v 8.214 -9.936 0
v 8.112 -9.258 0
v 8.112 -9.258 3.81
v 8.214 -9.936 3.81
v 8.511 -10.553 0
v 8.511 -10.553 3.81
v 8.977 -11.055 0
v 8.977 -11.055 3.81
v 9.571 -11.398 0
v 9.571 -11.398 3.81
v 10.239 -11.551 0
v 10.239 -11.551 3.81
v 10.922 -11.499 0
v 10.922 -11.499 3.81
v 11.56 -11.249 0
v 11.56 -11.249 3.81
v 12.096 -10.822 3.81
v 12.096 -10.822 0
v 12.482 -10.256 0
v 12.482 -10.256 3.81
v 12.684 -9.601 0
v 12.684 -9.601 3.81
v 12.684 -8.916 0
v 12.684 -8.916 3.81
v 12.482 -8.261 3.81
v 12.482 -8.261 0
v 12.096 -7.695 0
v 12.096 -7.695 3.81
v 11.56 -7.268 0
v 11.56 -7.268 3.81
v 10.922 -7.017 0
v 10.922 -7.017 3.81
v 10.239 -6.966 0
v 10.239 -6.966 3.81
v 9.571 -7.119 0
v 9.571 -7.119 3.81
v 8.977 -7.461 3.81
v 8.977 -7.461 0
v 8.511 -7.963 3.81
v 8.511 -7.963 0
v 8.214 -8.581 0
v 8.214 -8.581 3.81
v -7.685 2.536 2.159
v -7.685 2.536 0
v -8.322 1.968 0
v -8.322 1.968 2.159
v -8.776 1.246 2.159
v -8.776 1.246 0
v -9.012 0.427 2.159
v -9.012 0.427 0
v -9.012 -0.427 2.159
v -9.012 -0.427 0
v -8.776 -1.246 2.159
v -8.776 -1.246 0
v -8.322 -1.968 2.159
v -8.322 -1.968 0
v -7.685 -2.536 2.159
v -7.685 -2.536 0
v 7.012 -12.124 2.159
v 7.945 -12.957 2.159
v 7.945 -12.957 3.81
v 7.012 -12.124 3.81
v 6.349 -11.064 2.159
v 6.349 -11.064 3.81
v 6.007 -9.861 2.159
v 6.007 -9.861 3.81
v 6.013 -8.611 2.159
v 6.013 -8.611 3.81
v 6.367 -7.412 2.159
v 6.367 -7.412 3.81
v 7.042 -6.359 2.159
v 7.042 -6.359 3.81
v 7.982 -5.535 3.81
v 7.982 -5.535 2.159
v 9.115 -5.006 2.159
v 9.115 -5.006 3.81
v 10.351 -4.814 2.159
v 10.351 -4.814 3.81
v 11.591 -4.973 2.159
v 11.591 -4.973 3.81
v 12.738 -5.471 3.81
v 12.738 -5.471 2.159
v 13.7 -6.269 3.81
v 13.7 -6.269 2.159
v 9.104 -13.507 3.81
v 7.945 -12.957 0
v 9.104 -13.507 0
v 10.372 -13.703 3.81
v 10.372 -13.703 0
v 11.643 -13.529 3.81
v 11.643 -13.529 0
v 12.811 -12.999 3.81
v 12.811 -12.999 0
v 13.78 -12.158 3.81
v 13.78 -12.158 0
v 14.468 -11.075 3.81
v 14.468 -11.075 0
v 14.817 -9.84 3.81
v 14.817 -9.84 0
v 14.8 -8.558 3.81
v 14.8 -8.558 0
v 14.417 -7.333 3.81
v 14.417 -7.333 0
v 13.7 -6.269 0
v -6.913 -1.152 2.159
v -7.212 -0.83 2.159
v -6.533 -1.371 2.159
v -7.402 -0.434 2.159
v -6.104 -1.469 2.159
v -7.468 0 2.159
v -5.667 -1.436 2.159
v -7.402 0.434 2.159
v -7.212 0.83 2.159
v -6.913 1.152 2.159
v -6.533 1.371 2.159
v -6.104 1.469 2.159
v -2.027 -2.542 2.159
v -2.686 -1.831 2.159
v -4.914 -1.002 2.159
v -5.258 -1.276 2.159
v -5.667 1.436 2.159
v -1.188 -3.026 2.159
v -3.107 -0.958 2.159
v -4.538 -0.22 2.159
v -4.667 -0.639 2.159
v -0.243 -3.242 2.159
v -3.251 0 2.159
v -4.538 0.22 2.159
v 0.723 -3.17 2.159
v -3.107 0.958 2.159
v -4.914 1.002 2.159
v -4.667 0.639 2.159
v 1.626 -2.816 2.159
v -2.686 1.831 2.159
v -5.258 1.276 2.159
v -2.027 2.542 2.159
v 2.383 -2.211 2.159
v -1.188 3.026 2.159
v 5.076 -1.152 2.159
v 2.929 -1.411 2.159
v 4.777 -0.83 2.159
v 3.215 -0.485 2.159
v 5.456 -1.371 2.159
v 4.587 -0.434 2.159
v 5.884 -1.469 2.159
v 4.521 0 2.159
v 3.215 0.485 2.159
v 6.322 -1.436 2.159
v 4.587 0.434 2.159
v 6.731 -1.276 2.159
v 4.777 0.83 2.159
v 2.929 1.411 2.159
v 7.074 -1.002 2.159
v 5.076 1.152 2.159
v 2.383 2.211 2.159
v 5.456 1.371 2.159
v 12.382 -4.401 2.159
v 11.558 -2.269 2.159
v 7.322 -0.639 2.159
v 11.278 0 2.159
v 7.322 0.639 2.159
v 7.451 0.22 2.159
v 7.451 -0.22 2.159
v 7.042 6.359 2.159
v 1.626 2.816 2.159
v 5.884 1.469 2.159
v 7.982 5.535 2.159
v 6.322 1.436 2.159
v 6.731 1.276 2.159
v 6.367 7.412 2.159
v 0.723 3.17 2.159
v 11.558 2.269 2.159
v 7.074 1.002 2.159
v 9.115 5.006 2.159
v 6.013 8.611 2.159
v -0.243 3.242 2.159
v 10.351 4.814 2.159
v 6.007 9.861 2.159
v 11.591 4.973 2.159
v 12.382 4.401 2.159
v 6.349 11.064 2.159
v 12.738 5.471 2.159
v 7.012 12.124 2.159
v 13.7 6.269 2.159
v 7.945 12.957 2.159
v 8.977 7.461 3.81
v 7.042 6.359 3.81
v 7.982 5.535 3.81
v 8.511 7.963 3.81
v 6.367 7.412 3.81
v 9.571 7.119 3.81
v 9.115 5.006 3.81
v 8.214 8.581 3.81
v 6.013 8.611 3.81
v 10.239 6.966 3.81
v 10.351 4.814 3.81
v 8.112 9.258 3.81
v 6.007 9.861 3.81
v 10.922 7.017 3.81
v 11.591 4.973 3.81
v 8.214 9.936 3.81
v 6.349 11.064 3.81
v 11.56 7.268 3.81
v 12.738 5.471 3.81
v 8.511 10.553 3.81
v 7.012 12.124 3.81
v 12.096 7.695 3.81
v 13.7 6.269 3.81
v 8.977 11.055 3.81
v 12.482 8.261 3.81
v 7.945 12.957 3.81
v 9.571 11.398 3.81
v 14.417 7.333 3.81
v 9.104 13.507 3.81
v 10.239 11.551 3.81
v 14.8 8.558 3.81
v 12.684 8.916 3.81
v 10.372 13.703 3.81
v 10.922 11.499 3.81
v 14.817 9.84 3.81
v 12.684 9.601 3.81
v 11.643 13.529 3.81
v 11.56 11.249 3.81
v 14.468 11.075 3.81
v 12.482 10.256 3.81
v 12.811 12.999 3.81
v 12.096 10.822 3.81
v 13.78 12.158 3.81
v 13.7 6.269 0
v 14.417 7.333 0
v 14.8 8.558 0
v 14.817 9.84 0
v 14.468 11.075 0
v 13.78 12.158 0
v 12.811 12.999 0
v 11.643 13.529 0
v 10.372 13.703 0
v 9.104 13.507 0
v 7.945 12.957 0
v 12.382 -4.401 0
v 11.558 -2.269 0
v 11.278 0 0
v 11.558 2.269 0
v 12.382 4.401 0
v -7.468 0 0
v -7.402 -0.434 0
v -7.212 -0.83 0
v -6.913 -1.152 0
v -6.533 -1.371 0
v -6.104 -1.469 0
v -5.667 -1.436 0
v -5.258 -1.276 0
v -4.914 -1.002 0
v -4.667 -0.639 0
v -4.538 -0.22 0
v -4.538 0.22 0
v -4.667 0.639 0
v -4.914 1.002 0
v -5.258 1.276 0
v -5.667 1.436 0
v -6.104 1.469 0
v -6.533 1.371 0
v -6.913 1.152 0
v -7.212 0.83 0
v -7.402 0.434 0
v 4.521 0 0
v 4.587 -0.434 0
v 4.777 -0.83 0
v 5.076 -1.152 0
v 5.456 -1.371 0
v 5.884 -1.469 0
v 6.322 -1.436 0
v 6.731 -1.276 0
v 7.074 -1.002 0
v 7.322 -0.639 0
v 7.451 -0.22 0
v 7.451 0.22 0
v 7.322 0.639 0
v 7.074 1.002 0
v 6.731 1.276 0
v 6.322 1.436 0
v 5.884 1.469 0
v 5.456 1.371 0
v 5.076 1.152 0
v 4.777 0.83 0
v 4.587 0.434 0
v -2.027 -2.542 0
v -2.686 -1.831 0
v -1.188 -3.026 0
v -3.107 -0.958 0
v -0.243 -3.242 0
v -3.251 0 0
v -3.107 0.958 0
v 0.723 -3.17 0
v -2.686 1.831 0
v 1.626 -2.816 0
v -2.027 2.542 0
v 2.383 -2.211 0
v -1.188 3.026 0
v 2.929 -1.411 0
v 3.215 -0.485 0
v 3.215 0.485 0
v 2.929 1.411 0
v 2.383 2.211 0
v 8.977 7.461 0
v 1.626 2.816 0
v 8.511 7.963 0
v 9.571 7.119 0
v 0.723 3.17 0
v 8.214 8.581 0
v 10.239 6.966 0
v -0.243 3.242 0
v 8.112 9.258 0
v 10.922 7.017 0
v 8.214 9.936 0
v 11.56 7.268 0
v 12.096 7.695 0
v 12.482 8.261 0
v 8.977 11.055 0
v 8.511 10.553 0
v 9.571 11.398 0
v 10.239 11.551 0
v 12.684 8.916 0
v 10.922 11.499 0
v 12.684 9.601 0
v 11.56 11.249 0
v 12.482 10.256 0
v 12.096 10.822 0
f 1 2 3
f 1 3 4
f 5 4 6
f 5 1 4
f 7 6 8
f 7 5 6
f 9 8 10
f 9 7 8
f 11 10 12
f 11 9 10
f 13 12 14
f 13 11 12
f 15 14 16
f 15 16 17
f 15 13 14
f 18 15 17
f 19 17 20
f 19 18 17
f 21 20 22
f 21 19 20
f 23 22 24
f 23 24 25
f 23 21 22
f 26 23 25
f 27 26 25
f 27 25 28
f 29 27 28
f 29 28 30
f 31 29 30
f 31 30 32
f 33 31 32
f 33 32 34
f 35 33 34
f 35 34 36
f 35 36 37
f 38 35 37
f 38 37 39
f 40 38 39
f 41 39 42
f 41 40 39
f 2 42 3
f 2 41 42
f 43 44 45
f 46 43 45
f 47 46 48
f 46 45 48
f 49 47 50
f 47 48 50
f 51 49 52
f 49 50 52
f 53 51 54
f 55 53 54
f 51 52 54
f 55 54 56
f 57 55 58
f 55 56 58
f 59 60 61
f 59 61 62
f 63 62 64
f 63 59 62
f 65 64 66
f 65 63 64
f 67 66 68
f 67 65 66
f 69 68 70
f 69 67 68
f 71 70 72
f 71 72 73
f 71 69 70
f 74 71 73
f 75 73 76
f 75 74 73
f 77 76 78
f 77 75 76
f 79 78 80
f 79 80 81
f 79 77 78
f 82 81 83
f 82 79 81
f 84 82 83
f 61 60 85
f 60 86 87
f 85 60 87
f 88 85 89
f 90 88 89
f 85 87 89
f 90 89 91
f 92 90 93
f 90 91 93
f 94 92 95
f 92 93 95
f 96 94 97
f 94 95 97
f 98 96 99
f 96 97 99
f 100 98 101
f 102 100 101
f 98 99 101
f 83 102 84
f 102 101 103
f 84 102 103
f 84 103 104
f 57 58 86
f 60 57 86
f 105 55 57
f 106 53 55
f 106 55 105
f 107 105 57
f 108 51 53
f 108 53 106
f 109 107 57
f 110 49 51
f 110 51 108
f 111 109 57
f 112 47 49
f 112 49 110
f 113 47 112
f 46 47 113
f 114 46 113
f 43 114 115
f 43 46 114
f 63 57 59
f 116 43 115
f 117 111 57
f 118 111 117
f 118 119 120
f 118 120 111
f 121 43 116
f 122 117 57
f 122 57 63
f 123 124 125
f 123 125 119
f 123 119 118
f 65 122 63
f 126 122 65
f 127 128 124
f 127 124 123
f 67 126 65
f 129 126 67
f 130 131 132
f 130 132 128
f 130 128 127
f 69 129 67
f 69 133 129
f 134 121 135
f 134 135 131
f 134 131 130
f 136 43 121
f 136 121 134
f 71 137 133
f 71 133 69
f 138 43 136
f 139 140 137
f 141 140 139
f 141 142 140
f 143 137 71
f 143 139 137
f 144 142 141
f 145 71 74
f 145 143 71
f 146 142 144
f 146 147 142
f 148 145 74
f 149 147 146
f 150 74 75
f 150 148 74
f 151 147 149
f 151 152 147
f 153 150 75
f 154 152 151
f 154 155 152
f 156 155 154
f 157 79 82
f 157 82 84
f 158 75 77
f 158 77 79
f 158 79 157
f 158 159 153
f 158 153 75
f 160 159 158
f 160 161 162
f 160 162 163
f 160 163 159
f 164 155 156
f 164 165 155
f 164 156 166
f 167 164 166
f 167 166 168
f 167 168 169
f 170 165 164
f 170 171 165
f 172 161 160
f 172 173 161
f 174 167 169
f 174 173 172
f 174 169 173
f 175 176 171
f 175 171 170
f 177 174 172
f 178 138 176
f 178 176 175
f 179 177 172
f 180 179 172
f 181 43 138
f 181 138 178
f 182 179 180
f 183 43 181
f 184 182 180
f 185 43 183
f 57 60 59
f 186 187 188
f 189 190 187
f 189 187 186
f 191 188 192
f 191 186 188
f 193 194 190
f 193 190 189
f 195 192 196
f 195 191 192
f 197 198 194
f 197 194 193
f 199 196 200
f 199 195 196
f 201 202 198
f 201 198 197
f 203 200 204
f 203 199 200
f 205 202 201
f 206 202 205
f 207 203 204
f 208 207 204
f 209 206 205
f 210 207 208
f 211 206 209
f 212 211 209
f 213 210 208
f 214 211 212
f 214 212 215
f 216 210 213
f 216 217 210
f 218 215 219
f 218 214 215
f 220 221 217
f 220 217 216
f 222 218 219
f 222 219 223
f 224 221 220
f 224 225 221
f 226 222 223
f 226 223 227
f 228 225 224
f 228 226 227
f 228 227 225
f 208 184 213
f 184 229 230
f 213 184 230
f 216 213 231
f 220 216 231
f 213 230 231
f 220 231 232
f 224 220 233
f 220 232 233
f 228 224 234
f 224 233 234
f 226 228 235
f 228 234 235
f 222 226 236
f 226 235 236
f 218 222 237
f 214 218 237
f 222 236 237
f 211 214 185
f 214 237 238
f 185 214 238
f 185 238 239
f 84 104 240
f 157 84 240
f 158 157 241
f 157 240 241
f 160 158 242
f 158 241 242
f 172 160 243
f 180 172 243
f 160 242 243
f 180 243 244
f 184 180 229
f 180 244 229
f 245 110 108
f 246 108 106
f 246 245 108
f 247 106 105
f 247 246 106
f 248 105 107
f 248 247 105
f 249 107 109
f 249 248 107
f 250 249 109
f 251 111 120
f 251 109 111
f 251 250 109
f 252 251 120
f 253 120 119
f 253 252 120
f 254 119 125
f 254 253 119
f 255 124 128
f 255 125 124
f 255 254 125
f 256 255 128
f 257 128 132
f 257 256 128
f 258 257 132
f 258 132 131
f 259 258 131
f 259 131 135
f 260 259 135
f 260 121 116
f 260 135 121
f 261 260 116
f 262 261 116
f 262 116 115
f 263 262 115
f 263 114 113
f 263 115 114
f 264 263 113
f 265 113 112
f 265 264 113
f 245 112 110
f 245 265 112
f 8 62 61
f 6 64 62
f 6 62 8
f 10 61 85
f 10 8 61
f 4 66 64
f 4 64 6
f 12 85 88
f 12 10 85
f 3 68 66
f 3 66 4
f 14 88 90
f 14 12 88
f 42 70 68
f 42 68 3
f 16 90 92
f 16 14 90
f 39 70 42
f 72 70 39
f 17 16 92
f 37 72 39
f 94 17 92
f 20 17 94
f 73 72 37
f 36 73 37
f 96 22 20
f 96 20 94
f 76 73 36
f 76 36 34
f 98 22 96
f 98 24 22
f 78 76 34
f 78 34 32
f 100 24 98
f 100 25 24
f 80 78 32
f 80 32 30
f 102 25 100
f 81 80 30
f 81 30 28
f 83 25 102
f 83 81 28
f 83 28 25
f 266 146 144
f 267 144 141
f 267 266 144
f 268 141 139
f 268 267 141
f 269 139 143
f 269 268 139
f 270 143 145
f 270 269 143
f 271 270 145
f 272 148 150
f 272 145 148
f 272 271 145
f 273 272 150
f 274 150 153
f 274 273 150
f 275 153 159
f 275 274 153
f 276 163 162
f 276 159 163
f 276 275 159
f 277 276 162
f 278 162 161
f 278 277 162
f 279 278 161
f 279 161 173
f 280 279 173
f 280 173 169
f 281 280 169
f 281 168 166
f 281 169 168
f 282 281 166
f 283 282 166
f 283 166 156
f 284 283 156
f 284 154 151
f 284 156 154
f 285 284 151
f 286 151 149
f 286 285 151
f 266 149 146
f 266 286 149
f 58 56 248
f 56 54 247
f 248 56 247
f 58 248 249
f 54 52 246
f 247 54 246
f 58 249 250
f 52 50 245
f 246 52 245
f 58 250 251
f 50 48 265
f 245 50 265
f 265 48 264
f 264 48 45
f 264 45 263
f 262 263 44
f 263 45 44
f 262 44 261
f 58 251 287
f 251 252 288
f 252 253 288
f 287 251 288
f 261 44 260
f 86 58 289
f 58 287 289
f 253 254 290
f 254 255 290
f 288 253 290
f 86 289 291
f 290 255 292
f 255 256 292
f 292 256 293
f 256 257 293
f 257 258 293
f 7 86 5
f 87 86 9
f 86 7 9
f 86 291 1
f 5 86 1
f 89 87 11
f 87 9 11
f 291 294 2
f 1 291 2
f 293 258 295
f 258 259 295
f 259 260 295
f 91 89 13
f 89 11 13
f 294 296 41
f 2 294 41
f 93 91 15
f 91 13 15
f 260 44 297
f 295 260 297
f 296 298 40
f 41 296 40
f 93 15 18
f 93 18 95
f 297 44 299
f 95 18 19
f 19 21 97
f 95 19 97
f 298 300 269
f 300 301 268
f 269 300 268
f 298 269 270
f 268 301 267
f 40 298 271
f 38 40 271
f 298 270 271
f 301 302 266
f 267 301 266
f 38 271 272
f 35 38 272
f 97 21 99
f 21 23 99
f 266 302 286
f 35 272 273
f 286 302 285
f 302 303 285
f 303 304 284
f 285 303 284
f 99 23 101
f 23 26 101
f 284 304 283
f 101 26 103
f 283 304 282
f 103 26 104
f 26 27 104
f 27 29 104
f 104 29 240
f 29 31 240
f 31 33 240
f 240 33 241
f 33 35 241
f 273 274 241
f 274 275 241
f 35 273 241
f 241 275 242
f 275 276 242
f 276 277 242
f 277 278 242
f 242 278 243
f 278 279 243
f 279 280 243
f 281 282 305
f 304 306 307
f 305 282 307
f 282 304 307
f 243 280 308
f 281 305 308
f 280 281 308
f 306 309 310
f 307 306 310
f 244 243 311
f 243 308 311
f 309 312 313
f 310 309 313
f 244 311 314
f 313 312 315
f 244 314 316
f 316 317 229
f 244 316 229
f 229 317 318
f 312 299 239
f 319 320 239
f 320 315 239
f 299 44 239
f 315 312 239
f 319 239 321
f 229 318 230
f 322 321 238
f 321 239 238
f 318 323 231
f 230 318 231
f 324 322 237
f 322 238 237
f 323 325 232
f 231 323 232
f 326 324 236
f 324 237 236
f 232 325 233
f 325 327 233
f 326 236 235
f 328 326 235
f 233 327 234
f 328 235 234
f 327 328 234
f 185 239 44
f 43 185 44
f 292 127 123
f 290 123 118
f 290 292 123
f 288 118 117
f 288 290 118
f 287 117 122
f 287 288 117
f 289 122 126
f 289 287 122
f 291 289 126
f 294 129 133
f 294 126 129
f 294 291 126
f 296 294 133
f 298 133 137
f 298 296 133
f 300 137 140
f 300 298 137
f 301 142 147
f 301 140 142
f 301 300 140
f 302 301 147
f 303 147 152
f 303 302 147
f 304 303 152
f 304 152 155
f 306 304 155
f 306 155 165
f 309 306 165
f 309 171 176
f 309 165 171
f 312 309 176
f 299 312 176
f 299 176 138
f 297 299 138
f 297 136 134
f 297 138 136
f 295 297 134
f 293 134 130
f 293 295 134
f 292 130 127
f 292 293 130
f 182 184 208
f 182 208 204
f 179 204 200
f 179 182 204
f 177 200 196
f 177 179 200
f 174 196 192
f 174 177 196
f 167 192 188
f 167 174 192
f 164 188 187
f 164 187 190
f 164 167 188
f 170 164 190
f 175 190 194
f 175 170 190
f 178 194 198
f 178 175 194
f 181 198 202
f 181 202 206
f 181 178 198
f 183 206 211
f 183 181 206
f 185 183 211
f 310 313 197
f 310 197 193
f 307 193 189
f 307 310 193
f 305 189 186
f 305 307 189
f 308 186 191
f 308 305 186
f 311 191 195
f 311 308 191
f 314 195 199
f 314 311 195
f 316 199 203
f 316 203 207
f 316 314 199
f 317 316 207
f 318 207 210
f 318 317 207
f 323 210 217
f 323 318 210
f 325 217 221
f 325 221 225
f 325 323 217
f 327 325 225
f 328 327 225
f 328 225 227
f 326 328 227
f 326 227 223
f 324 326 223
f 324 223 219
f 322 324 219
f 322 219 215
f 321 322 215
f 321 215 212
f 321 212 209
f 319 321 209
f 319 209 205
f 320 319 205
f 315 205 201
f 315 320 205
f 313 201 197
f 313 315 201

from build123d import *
from build123d.topology import SkipClean

# Parameters (mm, degrees)
SKETCH1_R           = 3.2512
SKETCH1_R_2         = 1.4732
SKETCH1_R_3         = 2.2987
BOSS_EXTRUDE1_DEPTH = 3.81
CUT_EXTRUDE2_START  = -1.651
CUT_EXTRUDE2_DEPTH  = 1.651


with BuildPart() as part:
    # Sketch1 → Boss-Extrude1 (new body)
    with BuildSketch(Plane.XY):
        with BuildLine():
            Line((7.944916334, 12.956699963), (-7.685191608, 2.536045689))
            ThreePointArc((-7.685191608, 2.536045689), (-9.0424, 0), (-7.685191608, -2.536045689))
            Line((-7.685191608, -2.536045689), (7.944916334, -12.956699963))
            ThreePointArc((7.944916334, -12.956699963), (13.779763951, -12.157804059), (13.70040037, -6.26905353))
            ThreePointArc((13.70040037, -6.26905353), (11.2776, 0), (13.70040037, 6.26905353))
            ThreePointArc((13.70040037, 6.26905353), (13.779763951, 12.157804059), (7.944916334, 12.956699963))
        make_face()
        with Locations(Location((0, 0, 0), (0, 0, 180))):
            Circle(SKETCH1_R, mode=Mode.SUBTRACT)
        with Locations(Location((-5.9944, 0, 0), (0, 0, 180))):
            Circle(SKETCH1_R_2, mode=Mode.SUBTRACT)
        with Locations(Location((5.9944, 0, 0), (0, 0, 180))):
            Circle(SKETCH1_R_2, mode=Mode.SUBTRACT)
        with Locations(Location((10.410654097, 9.2583, 0), (0, 0, 180))):
            Circle(SKETCH1_R_3, mode=Mode.SUBTRACT)
        with Locations(Location((10.410654097, -9.2583, 0), (0, 0, 180))):
            Circle(SKETCH1_R_3, mode=Mode.SUBTRACT)
    extrude(amount=BOSS_EXTRUDE1_DEPTH)

    # Sketch2 → Cut-Extrude2 (cut)
    with SkipClean():  # the faces are left unmerged after this step: merging them gives an invalid solid
        with BuildSketch(Plane.XY.offset(3.81).offset(CUT_EXTRUDE2_START)):
            with BuildLine():
                Line((7.944916334, 12.956699963), (-7.685191608, 2.536045689))
                ThreePointArc((-7.685191608, 2.536045689), (-9.0424, 0), (-7.685191608, -2.536045689))
                Line((-7.685191608, -2.536045689), (7.944916334, -12.956699963))
                ThreePointArc((7.944916334, -12.956699963), (7.041544243, -6.358795941), (13.70040037, -6.26905353))
                ThreePointArc((13.70040037, -6.26905353), (11.2776, 0), (13.70040037, 6.26905353))
                ThreePointArc((13.70040037, 6.26905353), (7.041544243, 6.358795941), (7.944916334, 12.956699963))
            make_face()
        extrude(amount=CUT_EXTRUDE2_DEPTH, mode=Mode.SUBTRACT)


solid = part.part
